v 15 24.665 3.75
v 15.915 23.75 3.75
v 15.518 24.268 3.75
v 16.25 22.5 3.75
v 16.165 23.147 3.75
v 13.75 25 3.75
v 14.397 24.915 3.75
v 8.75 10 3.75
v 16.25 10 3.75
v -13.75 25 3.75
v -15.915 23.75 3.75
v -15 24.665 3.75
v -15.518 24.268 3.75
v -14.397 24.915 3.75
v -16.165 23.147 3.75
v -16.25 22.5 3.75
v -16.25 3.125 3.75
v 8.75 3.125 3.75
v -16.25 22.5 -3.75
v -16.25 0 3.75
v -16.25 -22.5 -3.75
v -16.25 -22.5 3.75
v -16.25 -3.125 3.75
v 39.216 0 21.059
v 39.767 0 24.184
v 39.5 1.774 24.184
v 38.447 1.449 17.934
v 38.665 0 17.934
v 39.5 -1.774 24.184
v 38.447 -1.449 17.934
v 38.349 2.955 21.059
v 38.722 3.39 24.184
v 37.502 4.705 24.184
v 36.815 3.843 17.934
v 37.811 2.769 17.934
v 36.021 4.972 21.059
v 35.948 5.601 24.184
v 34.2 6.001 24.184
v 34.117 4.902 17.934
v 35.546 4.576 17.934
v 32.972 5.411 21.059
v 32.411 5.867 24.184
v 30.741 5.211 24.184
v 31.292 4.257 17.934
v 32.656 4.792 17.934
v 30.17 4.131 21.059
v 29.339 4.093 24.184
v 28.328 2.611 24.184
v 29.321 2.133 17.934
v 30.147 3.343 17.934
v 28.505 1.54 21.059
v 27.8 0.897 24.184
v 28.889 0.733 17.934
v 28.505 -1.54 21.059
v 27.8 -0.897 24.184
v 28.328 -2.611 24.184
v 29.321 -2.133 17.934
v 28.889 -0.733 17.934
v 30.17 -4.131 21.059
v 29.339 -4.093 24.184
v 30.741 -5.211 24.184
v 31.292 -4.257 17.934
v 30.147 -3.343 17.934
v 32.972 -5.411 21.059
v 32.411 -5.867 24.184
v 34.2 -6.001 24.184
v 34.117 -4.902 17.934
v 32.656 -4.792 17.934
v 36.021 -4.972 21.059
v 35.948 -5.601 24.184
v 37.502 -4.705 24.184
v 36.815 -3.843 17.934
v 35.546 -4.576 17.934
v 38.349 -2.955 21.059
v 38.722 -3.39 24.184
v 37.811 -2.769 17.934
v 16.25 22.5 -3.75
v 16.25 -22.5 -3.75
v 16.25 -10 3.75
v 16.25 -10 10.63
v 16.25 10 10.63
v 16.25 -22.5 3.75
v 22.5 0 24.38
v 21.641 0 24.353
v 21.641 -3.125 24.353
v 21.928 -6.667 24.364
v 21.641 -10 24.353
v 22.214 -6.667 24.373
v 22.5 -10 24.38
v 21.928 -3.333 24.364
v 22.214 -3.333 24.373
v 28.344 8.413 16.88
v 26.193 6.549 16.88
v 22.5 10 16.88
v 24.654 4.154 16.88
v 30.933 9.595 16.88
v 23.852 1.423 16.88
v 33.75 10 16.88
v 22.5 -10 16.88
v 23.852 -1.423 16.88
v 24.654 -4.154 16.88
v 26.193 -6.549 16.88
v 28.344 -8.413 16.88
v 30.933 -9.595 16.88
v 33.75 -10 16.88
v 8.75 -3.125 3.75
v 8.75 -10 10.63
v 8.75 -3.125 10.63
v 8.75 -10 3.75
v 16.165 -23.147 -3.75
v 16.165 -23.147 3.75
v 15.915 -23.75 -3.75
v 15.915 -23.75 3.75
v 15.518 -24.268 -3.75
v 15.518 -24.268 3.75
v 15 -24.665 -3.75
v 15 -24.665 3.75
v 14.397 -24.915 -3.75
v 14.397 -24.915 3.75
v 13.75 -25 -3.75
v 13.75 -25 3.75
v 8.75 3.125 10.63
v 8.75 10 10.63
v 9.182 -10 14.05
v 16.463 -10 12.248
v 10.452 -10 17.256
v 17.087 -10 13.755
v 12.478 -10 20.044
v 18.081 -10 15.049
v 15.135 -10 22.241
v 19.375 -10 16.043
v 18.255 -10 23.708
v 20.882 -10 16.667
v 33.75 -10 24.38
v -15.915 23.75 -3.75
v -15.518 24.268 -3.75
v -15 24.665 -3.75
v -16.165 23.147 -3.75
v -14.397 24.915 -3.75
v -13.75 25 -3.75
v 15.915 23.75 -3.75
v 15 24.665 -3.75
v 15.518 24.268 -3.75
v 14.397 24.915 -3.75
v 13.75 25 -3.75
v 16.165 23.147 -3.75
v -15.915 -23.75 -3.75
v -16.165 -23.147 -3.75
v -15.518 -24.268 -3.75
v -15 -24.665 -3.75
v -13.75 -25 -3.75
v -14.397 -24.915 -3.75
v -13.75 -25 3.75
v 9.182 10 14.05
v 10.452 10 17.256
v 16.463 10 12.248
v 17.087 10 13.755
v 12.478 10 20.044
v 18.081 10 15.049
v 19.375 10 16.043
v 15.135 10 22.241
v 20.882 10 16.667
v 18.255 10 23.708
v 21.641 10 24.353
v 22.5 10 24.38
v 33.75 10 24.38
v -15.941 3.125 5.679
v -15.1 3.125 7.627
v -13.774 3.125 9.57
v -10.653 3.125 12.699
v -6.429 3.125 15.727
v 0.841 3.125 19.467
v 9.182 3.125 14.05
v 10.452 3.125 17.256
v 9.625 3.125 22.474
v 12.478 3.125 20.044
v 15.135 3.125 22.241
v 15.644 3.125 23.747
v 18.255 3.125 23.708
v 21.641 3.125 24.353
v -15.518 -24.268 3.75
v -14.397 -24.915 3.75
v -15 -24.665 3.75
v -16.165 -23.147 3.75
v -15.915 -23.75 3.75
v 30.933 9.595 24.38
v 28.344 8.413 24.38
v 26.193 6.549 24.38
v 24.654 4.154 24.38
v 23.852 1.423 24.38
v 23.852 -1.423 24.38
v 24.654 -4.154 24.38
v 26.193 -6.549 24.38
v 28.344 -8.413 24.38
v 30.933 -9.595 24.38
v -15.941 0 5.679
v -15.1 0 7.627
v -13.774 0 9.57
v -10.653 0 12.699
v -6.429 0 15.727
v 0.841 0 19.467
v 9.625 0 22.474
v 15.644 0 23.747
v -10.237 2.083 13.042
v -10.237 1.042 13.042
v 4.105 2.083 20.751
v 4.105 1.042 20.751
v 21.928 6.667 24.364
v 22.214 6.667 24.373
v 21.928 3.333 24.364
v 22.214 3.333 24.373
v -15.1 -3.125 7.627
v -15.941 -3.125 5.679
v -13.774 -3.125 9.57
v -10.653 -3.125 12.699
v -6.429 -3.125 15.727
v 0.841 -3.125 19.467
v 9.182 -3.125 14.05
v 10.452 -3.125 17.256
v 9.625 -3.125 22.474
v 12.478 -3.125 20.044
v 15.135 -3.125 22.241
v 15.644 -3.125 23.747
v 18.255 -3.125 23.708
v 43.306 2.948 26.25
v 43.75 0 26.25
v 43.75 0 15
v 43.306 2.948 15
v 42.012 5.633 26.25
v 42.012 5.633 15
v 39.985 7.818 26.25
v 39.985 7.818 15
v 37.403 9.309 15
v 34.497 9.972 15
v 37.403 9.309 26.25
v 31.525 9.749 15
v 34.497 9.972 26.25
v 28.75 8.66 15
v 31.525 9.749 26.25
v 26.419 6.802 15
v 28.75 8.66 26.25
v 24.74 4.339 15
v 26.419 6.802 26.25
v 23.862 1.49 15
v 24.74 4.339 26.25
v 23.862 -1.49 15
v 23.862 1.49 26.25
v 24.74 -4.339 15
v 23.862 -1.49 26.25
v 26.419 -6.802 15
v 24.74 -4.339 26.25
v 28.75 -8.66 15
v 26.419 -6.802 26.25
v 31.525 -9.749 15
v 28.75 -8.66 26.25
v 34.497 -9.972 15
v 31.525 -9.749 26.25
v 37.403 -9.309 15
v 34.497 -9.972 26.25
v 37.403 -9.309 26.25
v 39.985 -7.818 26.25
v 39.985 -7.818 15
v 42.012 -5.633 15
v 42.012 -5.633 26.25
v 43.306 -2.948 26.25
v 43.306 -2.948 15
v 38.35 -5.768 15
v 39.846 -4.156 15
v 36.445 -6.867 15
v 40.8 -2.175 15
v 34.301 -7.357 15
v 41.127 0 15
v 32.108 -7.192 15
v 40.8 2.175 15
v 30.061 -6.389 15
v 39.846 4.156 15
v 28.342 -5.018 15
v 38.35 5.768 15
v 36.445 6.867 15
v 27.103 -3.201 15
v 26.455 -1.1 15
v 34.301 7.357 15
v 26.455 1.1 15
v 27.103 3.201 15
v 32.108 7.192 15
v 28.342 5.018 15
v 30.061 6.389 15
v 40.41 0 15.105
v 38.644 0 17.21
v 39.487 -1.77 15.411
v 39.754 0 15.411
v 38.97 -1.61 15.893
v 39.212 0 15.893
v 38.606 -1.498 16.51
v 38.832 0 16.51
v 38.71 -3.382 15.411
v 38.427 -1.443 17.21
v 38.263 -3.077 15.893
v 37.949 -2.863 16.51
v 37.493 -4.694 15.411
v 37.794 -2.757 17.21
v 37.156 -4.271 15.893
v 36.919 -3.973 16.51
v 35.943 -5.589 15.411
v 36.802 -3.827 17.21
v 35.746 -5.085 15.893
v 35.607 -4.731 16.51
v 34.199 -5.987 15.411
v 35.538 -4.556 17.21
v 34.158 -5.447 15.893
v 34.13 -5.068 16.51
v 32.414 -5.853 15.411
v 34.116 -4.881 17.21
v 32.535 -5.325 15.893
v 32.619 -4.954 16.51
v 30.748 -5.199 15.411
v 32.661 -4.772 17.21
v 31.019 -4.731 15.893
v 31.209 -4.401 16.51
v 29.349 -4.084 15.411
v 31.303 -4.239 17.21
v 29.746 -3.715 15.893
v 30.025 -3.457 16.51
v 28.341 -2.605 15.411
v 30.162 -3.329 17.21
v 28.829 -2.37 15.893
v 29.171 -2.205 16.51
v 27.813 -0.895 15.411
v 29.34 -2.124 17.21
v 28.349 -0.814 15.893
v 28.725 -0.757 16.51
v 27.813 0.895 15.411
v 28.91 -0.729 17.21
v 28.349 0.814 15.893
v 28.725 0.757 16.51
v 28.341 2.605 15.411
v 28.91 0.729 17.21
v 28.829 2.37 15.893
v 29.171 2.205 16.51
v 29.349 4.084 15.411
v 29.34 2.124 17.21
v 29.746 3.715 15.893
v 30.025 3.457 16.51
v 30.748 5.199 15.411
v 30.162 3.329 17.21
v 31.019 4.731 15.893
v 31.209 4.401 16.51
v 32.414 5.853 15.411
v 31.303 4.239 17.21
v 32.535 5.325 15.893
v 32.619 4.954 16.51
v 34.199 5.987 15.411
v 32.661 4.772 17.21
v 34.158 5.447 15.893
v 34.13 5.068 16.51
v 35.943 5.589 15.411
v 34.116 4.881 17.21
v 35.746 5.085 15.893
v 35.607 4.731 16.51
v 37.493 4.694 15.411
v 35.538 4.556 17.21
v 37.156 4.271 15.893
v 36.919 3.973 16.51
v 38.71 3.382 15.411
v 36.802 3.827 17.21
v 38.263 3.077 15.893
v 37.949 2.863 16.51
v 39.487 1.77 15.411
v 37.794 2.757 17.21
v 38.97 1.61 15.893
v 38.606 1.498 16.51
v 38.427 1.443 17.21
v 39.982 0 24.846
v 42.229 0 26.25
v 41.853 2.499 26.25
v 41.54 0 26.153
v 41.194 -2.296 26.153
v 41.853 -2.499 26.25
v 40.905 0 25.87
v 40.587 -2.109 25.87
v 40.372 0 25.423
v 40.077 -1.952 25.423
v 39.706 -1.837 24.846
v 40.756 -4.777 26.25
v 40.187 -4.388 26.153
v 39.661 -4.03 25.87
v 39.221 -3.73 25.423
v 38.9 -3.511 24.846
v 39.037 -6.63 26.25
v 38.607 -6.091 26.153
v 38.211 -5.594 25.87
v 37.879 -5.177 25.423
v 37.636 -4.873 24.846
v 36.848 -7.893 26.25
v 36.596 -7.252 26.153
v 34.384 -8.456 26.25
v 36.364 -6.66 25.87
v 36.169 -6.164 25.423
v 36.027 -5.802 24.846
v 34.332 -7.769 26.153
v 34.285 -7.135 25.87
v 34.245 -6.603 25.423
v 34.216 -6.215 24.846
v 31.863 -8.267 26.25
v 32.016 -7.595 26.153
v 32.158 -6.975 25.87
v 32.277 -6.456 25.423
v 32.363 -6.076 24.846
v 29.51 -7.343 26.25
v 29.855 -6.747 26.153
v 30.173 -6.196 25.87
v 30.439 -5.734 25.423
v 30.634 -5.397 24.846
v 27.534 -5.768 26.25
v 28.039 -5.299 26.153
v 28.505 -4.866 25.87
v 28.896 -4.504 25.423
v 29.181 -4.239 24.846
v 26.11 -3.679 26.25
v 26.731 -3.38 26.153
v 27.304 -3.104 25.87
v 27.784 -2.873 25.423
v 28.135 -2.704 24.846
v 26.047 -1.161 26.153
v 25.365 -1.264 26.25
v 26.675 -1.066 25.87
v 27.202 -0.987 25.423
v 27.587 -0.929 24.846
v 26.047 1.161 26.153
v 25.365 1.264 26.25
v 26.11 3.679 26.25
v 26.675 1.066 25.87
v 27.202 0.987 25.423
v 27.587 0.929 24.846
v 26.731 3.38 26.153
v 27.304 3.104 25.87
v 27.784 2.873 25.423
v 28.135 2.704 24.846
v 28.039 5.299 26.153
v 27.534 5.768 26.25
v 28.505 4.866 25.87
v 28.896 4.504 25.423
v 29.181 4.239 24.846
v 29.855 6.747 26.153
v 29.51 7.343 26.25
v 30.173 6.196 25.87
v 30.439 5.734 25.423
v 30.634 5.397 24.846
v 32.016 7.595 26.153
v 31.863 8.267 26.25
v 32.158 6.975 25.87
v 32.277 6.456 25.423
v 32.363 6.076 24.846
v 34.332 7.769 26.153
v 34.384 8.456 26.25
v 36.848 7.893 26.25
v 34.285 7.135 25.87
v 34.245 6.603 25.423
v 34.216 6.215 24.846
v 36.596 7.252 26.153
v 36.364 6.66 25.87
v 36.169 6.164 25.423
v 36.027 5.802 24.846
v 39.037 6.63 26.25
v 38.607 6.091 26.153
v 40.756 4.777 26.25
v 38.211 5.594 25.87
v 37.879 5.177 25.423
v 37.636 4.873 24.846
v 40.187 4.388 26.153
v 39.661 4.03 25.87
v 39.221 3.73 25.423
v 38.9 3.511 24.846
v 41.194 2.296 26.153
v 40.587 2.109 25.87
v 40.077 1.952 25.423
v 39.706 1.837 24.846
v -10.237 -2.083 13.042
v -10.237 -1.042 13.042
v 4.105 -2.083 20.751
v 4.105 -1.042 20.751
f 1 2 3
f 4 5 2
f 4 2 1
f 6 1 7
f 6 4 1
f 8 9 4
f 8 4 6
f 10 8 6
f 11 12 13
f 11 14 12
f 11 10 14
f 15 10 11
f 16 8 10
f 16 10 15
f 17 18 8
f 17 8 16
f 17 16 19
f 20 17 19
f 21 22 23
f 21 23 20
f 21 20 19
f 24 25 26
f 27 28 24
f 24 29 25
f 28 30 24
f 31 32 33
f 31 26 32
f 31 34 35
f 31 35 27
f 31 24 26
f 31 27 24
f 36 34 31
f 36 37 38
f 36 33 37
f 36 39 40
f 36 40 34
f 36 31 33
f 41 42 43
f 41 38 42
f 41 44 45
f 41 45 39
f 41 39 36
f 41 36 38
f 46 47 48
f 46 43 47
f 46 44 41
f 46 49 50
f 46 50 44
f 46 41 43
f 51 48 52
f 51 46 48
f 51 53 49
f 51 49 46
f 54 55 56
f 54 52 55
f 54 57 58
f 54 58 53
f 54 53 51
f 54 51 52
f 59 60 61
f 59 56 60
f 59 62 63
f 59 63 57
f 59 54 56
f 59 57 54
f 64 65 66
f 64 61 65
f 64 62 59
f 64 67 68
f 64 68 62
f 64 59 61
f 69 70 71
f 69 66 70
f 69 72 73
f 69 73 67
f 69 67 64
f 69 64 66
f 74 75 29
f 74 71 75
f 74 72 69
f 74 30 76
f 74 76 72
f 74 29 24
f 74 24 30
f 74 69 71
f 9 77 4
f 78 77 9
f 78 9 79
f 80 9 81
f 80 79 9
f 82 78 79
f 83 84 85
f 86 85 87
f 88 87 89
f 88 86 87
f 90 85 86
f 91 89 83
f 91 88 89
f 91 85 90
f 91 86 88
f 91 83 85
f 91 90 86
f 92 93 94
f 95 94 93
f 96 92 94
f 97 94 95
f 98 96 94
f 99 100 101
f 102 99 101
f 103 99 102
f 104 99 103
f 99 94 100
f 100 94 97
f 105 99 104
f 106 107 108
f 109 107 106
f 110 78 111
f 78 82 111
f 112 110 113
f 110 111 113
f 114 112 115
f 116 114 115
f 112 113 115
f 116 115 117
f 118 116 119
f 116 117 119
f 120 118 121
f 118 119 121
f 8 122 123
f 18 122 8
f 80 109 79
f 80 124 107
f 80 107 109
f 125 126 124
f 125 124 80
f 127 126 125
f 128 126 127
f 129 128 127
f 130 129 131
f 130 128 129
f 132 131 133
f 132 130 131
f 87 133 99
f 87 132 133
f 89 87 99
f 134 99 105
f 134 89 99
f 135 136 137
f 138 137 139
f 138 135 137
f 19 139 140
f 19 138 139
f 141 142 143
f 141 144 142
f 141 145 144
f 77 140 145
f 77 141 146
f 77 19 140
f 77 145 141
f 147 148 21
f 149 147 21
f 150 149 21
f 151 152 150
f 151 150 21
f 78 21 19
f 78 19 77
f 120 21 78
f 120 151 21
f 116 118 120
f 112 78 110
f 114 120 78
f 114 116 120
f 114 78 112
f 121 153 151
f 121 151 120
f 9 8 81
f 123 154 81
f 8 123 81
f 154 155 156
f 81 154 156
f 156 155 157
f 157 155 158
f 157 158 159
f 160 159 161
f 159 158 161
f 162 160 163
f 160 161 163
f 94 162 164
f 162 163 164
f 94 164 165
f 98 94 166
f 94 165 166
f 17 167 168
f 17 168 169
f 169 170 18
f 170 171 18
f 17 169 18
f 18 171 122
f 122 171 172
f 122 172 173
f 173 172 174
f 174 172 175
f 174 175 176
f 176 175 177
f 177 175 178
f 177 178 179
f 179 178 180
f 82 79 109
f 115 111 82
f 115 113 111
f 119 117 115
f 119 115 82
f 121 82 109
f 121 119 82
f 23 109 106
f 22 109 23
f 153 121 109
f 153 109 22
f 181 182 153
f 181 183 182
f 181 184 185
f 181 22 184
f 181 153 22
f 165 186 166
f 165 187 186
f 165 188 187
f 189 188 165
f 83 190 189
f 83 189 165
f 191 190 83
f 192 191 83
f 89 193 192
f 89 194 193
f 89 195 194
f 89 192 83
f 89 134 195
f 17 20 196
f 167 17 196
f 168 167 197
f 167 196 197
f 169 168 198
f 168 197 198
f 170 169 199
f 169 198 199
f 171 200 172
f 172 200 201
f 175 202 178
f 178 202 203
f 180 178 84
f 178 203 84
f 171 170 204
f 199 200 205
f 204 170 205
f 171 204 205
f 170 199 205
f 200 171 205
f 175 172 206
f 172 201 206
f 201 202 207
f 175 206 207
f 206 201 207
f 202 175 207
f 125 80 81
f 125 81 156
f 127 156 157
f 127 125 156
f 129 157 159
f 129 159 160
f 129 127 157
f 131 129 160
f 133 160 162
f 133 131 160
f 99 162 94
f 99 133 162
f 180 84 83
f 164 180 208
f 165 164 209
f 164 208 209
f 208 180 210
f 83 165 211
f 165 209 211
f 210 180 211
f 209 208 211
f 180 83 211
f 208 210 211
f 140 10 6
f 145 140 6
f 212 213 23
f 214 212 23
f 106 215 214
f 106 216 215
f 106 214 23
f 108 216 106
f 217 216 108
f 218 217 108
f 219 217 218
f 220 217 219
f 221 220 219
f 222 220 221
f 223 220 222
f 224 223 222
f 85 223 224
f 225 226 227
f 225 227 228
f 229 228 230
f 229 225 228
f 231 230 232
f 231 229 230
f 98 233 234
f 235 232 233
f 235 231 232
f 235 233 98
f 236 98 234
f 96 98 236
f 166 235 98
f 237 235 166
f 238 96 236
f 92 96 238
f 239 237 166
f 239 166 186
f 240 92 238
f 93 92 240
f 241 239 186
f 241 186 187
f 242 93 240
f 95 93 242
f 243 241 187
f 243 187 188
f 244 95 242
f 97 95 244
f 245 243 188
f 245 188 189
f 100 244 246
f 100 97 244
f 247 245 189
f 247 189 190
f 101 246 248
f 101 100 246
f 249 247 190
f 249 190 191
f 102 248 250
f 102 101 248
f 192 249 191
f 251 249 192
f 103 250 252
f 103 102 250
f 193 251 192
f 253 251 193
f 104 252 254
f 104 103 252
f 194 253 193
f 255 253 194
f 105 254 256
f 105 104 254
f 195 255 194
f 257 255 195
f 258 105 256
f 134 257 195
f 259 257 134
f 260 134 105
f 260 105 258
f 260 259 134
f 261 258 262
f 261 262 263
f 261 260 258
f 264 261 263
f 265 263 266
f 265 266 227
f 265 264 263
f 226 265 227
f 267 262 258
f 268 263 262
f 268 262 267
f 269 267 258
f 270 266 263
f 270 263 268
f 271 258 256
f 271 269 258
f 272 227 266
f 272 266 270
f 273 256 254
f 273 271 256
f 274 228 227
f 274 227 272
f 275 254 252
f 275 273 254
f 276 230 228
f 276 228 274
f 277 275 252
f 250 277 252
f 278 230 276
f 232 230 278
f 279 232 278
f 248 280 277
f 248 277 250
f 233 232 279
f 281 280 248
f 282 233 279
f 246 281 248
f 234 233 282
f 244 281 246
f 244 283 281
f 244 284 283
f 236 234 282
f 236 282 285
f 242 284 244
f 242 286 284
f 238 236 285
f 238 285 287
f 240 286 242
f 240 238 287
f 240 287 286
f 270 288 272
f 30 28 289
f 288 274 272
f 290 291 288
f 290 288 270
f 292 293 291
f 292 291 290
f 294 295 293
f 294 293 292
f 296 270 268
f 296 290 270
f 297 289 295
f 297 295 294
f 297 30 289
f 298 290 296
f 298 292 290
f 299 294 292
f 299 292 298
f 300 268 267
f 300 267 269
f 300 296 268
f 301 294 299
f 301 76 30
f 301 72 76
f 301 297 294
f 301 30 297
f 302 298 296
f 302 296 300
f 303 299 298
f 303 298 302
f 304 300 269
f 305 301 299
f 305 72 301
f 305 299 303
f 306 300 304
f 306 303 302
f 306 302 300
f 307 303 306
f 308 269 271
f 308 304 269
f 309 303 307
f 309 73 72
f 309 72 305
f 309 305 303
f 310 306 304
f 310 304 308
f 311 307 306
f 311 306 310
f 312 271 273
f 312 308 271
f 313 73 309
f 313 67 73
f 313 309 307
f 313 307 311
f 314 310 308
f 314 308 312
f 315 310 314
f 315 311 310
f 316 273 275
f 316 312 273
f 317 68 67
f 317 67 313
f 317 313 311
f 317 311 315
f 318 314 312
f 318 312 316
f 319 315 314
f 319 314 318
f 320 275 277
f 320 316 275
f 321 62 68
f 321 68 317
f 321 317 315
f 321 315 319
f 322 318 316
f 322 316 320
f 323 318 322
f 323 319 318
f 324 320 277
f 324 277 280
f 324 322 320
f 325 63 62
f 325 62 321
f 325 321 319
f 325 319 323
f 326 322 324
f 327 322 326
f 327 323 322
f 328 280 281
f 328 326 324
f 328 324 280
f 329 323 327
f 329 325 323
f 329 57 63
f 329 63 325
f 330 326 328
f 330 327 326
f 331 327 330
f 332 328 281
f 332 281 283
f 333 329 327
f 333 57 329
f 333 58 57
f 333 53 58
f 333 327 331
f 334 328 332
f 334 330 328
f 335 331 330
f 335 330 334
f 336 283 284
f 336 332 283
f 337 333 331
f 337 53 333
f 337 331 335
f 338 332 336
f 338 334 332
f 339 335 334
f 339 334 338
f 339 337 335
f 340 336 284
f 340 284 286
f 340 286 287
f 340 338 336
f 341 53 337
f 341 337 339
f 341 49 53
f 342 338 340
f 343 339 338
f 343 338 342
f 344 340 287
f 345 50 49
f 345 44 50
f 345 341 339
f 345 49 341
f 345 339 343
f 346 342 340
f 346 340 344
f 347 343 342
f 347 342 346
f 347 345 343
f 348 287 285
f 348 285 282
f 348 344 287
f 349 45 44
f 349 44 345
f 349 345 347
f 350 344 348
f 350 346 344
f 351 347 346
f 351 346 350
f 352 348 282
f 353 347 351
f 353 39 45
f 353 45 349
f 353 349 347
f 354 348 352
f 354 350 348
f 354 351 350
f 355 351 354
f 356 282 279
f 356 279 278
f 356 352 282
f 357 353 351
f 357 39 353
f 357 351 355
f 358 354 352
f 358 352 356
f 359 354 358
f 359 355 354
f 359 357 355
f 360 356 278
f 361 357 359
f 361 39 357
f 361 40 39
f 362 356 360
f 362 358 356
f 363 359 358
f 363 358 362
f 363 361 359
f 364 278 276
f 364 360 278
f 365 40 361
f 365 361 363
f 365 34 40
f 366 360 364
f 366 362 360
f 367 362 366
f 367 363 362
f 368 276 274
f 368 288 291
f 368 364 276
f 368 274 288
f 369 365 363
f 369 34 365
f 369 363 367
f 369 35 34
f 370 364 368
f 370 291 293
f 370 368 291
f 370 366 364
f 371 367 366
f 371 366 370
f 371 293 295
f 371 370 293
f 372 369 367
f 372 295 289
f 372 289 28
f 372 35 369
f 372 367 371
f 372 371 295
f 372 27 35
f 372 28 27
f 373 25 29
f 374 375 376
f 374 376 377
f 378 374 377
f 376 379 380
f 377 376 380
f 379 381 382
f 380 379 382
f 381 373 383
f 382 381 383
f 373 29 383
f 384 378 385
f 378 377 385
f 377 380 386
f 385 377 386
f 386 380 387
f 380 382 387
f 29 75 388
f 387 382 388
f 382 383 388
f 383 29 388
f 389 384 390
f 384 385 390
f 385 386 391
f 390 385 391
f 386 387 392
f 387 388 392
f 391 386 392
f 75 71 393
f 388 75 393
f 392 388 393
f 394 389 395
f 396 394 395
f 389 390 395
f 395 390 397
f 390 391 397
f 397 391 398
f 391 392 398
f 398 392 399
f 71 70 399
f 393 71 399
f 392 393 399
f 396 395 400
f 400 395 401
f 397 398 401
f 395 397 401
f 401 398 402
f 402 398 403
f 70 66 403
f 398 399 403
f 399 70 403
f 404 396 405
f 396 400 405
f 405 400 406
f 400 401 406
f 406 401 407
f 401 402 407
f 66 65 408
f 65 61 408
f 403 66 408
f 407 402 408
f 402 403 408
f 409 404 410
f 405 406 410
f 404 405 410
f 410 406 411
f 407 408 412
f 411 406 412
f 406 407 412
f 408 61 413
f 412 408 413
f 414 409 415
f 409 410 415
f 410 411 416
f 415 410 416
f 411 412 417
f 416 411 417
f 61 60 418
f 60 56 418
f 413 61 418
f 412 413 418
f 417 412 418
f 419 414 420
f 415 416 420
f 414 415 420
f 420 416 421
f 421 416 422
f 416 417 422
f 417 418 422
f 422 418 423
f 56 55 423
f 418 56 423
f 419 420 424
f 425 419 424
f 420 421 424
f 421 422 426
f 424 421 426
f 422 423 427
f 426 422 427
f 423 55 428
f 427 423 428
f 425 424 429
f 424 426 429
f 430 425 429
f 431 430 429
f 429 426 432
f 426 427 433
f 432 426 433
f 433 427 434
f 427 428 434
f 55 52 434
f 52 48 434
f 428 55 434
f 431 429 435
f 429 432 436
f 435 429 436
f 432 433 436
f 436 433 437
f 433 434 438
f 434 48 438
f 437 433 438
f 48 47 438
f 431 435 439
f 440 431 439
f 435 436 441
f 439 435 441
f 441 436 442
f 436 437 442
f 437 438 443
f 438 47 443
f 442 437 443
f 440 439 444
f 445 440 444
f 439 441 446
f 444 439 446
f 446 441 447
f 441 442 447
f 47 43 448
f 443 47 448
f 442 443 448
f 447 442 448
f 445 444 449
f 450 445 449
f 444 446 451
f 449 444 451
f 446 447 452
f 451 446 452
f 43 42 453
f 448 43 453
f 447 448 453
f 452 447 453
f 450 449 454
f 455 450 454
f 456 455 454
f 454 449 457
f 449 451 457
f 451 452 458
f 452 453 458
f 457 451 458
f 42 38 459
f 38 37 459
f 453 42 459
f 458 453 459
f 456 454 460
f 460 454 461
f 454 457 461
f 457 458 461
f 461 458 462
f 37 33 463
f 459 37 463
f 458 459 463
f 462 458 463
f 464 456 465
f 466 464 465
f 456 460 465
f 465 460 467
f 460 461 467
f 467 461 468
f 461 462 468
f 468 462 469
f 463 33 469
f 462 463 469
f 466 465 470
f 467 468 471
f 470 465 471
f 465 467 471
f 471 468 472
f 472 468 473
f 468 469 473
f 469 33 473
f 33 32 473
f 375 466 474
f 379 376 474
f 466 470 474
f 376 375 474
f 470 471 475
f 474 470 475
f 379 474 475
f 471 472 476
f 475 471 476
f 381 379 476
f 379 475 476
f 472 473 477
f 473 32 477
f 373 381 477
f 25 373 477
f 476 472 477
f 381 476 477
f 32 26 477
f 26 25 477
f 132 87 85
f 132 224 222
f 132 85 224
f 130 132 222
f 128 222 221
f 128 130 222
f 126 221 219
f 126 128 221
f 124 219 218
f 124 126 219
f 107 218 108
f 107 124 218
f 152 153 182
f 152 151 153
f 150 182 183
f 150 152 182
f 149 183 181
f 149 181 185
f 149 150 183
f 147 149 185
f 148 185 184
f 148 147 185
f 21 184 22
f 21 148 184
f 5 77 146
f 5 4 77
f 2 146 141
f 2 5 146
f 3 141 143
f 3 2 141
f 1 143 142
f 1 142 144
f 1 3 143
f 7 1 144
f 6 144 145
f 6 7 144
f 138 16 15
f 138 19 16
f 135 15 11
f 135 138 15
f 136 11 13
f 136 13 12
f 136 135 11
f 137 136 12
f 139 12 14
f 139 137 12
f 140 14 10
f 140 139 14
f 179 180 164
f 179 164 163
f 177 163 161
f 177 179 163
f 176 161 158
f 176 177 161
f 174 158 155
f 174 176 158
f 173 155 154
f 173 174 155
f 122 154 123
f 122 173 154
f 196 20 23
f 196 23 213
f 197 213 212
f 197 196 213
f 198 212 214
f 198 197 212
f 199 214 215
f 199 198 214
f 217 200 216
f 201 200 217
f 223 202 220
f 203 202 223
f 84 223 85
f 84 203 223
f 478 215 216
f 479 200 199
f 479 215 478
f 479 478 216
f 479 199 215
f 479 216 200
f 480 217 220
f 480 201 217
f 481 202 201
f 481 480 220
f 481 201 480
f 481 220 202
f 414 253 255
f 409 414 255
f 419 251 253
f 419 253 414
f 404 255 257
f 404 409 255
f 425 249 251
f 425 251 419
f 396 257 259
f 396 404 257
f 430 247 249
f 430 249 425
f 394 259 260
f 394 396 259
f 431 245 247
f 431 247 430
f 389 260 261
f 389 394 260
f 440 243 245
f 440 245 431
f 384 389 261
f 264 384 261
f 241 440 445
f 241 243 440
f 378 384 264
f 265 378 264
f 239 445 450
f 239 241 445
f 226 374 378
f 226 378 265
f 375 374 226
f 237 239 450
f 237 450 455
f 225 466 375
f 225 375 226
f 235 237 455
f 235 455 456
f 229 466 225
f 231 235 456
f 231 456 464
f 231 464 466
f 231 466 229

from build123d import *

# Parameters (mm, degrees)
F1_DEPTH = 25
F0_W     = 10
F0_H     = 7.5
F2_DEPTH = 10
F3_DEPTH = 3.125
F5_R     = 2.5
F6_R     = 6.3817313598
F7_DEPTH = 30.0010045886
F7_TAPER = 10
F8_R     = 2.5


with BuildPart() as f1:
    # F0 (on Front) → F1 (new body, symmetric)
    with BuildSketch(Plane.XZ):
        Polygon((16.25, -3.75), (16.25, 3.75), (8.75, 3.75), (-16.25, 3.75), (-16.25, -3.75), align=None)
    extrude(amount=F1_DEPTH, both=True)

    # F0 (on Front) → F2 (join, symmetric)
    with BuildSketch(Plane.XZ):
        with BuildLine():
            Line((8.75, 3.75), (16.25, 3.75))
            Line((16.25, 3.75), (16.25, 10.63))
            ThreePointArc((16.25, 10.63), (18.0805826176, 15.0494173824), (22.5, 16.88))
            Line((22.5, 16.88), (23.75, 16.88))
            Line((23.75, 16.88), (23.75, 24.38))
            Line((23.75, 24.38), (22.5, 24.38))
            add(Edge.make_bspline(
                [(21.641459386, 24.3531704797), (21.9284637446, 24.3648296115), (22.2146783802, 24.37378971), (22.5, 24.38)],
                knots=[43.1879789216, 43.1879789216, 43.1879789216, 43.1879789216, 43.8994236864, 43.8994236864, 43.8994236864, 43.8994236864], degree=3))
            ThreePointArc((21.641459386, 24.3531704797), (12.4783376269, 20.0442861269), (8.75, 10.63))
            Line((8.75, 10.63), (8.75, 3.75))
        make_face()
        with Locations((28.75, 20.63)):
            Rectangle(F0_W, F0_H)
    extrude(amount=F2_DEPTH, both=True)

    # F0 (on Front) → F3 (join, symmetric)
    with BuildSketch(Plane.XZ):
        with BuildLine():
            Line((-16.25, 3.75), (8.75, 3.75))
            Line((8.75, 3.75), (8.75, 10.63))
            ThreePointArc((8.75, 10.63), (12.4783376269, 20.0442861269), (21.641459386, 24.3531704797))
            add(Edge.make_bspline(
                [(-16.25, 3.75), (-16.1136864782, 12.9915711447), (4.2189709464, 23.645407395), (21.641459386, 24.3531704797)],
                knots=[0, 0, 0, 0, 43.1879789216, 43.1879789216, 43.1879789216, 43.1879789216], degree=3))
        make_face()
    extrude(amount=F3_DEPTH, both=True)

    # F0 (on Front) → F4 (revolve)
    with BuildSketch(Plane.XZ):
        Polygon((33.75, 24.38), (33.75, 16.88), (33.75, 15.0000045886), (43.75, 15.0000045886), (43.75, 26.2500045886), (33.75, 26.2500045886), align=None)
    revolve(axis=Axis((33.75, 0, 20.6250045886), (0, 0, 1)))

    # F5
    f5_edges = [f1.edges().sort_by_distance(p)[0] for p in [
        (16.25, -25, 0),
        (-16.25, -25, 0),
        (-16.25, 25, 0),
        (16.25, 25, 0),
    ]]
    fillet(f5_edges, radius=F5_R)

    # F6 (on face) → F7 (cut, through all)
    with BuildSketch(Plane.XY.offset(26.2500045886)):
        with Locations((33.75, 0)):
            Circle(F6_R)
    extrude(amount=-F7_DEPTH, taper=F7_TAPER, mode=Mode.SUBTRACT)

    # F8
    f8_edges = [f1.edges().sort_by_distance(p)[0] for p in [
        (27.368269, 0, 26.250005),
        (29.351947, 0, 15.000005),
    ]]
    fillet(f8_edges, radius=F8_R)


solid = f1.part
